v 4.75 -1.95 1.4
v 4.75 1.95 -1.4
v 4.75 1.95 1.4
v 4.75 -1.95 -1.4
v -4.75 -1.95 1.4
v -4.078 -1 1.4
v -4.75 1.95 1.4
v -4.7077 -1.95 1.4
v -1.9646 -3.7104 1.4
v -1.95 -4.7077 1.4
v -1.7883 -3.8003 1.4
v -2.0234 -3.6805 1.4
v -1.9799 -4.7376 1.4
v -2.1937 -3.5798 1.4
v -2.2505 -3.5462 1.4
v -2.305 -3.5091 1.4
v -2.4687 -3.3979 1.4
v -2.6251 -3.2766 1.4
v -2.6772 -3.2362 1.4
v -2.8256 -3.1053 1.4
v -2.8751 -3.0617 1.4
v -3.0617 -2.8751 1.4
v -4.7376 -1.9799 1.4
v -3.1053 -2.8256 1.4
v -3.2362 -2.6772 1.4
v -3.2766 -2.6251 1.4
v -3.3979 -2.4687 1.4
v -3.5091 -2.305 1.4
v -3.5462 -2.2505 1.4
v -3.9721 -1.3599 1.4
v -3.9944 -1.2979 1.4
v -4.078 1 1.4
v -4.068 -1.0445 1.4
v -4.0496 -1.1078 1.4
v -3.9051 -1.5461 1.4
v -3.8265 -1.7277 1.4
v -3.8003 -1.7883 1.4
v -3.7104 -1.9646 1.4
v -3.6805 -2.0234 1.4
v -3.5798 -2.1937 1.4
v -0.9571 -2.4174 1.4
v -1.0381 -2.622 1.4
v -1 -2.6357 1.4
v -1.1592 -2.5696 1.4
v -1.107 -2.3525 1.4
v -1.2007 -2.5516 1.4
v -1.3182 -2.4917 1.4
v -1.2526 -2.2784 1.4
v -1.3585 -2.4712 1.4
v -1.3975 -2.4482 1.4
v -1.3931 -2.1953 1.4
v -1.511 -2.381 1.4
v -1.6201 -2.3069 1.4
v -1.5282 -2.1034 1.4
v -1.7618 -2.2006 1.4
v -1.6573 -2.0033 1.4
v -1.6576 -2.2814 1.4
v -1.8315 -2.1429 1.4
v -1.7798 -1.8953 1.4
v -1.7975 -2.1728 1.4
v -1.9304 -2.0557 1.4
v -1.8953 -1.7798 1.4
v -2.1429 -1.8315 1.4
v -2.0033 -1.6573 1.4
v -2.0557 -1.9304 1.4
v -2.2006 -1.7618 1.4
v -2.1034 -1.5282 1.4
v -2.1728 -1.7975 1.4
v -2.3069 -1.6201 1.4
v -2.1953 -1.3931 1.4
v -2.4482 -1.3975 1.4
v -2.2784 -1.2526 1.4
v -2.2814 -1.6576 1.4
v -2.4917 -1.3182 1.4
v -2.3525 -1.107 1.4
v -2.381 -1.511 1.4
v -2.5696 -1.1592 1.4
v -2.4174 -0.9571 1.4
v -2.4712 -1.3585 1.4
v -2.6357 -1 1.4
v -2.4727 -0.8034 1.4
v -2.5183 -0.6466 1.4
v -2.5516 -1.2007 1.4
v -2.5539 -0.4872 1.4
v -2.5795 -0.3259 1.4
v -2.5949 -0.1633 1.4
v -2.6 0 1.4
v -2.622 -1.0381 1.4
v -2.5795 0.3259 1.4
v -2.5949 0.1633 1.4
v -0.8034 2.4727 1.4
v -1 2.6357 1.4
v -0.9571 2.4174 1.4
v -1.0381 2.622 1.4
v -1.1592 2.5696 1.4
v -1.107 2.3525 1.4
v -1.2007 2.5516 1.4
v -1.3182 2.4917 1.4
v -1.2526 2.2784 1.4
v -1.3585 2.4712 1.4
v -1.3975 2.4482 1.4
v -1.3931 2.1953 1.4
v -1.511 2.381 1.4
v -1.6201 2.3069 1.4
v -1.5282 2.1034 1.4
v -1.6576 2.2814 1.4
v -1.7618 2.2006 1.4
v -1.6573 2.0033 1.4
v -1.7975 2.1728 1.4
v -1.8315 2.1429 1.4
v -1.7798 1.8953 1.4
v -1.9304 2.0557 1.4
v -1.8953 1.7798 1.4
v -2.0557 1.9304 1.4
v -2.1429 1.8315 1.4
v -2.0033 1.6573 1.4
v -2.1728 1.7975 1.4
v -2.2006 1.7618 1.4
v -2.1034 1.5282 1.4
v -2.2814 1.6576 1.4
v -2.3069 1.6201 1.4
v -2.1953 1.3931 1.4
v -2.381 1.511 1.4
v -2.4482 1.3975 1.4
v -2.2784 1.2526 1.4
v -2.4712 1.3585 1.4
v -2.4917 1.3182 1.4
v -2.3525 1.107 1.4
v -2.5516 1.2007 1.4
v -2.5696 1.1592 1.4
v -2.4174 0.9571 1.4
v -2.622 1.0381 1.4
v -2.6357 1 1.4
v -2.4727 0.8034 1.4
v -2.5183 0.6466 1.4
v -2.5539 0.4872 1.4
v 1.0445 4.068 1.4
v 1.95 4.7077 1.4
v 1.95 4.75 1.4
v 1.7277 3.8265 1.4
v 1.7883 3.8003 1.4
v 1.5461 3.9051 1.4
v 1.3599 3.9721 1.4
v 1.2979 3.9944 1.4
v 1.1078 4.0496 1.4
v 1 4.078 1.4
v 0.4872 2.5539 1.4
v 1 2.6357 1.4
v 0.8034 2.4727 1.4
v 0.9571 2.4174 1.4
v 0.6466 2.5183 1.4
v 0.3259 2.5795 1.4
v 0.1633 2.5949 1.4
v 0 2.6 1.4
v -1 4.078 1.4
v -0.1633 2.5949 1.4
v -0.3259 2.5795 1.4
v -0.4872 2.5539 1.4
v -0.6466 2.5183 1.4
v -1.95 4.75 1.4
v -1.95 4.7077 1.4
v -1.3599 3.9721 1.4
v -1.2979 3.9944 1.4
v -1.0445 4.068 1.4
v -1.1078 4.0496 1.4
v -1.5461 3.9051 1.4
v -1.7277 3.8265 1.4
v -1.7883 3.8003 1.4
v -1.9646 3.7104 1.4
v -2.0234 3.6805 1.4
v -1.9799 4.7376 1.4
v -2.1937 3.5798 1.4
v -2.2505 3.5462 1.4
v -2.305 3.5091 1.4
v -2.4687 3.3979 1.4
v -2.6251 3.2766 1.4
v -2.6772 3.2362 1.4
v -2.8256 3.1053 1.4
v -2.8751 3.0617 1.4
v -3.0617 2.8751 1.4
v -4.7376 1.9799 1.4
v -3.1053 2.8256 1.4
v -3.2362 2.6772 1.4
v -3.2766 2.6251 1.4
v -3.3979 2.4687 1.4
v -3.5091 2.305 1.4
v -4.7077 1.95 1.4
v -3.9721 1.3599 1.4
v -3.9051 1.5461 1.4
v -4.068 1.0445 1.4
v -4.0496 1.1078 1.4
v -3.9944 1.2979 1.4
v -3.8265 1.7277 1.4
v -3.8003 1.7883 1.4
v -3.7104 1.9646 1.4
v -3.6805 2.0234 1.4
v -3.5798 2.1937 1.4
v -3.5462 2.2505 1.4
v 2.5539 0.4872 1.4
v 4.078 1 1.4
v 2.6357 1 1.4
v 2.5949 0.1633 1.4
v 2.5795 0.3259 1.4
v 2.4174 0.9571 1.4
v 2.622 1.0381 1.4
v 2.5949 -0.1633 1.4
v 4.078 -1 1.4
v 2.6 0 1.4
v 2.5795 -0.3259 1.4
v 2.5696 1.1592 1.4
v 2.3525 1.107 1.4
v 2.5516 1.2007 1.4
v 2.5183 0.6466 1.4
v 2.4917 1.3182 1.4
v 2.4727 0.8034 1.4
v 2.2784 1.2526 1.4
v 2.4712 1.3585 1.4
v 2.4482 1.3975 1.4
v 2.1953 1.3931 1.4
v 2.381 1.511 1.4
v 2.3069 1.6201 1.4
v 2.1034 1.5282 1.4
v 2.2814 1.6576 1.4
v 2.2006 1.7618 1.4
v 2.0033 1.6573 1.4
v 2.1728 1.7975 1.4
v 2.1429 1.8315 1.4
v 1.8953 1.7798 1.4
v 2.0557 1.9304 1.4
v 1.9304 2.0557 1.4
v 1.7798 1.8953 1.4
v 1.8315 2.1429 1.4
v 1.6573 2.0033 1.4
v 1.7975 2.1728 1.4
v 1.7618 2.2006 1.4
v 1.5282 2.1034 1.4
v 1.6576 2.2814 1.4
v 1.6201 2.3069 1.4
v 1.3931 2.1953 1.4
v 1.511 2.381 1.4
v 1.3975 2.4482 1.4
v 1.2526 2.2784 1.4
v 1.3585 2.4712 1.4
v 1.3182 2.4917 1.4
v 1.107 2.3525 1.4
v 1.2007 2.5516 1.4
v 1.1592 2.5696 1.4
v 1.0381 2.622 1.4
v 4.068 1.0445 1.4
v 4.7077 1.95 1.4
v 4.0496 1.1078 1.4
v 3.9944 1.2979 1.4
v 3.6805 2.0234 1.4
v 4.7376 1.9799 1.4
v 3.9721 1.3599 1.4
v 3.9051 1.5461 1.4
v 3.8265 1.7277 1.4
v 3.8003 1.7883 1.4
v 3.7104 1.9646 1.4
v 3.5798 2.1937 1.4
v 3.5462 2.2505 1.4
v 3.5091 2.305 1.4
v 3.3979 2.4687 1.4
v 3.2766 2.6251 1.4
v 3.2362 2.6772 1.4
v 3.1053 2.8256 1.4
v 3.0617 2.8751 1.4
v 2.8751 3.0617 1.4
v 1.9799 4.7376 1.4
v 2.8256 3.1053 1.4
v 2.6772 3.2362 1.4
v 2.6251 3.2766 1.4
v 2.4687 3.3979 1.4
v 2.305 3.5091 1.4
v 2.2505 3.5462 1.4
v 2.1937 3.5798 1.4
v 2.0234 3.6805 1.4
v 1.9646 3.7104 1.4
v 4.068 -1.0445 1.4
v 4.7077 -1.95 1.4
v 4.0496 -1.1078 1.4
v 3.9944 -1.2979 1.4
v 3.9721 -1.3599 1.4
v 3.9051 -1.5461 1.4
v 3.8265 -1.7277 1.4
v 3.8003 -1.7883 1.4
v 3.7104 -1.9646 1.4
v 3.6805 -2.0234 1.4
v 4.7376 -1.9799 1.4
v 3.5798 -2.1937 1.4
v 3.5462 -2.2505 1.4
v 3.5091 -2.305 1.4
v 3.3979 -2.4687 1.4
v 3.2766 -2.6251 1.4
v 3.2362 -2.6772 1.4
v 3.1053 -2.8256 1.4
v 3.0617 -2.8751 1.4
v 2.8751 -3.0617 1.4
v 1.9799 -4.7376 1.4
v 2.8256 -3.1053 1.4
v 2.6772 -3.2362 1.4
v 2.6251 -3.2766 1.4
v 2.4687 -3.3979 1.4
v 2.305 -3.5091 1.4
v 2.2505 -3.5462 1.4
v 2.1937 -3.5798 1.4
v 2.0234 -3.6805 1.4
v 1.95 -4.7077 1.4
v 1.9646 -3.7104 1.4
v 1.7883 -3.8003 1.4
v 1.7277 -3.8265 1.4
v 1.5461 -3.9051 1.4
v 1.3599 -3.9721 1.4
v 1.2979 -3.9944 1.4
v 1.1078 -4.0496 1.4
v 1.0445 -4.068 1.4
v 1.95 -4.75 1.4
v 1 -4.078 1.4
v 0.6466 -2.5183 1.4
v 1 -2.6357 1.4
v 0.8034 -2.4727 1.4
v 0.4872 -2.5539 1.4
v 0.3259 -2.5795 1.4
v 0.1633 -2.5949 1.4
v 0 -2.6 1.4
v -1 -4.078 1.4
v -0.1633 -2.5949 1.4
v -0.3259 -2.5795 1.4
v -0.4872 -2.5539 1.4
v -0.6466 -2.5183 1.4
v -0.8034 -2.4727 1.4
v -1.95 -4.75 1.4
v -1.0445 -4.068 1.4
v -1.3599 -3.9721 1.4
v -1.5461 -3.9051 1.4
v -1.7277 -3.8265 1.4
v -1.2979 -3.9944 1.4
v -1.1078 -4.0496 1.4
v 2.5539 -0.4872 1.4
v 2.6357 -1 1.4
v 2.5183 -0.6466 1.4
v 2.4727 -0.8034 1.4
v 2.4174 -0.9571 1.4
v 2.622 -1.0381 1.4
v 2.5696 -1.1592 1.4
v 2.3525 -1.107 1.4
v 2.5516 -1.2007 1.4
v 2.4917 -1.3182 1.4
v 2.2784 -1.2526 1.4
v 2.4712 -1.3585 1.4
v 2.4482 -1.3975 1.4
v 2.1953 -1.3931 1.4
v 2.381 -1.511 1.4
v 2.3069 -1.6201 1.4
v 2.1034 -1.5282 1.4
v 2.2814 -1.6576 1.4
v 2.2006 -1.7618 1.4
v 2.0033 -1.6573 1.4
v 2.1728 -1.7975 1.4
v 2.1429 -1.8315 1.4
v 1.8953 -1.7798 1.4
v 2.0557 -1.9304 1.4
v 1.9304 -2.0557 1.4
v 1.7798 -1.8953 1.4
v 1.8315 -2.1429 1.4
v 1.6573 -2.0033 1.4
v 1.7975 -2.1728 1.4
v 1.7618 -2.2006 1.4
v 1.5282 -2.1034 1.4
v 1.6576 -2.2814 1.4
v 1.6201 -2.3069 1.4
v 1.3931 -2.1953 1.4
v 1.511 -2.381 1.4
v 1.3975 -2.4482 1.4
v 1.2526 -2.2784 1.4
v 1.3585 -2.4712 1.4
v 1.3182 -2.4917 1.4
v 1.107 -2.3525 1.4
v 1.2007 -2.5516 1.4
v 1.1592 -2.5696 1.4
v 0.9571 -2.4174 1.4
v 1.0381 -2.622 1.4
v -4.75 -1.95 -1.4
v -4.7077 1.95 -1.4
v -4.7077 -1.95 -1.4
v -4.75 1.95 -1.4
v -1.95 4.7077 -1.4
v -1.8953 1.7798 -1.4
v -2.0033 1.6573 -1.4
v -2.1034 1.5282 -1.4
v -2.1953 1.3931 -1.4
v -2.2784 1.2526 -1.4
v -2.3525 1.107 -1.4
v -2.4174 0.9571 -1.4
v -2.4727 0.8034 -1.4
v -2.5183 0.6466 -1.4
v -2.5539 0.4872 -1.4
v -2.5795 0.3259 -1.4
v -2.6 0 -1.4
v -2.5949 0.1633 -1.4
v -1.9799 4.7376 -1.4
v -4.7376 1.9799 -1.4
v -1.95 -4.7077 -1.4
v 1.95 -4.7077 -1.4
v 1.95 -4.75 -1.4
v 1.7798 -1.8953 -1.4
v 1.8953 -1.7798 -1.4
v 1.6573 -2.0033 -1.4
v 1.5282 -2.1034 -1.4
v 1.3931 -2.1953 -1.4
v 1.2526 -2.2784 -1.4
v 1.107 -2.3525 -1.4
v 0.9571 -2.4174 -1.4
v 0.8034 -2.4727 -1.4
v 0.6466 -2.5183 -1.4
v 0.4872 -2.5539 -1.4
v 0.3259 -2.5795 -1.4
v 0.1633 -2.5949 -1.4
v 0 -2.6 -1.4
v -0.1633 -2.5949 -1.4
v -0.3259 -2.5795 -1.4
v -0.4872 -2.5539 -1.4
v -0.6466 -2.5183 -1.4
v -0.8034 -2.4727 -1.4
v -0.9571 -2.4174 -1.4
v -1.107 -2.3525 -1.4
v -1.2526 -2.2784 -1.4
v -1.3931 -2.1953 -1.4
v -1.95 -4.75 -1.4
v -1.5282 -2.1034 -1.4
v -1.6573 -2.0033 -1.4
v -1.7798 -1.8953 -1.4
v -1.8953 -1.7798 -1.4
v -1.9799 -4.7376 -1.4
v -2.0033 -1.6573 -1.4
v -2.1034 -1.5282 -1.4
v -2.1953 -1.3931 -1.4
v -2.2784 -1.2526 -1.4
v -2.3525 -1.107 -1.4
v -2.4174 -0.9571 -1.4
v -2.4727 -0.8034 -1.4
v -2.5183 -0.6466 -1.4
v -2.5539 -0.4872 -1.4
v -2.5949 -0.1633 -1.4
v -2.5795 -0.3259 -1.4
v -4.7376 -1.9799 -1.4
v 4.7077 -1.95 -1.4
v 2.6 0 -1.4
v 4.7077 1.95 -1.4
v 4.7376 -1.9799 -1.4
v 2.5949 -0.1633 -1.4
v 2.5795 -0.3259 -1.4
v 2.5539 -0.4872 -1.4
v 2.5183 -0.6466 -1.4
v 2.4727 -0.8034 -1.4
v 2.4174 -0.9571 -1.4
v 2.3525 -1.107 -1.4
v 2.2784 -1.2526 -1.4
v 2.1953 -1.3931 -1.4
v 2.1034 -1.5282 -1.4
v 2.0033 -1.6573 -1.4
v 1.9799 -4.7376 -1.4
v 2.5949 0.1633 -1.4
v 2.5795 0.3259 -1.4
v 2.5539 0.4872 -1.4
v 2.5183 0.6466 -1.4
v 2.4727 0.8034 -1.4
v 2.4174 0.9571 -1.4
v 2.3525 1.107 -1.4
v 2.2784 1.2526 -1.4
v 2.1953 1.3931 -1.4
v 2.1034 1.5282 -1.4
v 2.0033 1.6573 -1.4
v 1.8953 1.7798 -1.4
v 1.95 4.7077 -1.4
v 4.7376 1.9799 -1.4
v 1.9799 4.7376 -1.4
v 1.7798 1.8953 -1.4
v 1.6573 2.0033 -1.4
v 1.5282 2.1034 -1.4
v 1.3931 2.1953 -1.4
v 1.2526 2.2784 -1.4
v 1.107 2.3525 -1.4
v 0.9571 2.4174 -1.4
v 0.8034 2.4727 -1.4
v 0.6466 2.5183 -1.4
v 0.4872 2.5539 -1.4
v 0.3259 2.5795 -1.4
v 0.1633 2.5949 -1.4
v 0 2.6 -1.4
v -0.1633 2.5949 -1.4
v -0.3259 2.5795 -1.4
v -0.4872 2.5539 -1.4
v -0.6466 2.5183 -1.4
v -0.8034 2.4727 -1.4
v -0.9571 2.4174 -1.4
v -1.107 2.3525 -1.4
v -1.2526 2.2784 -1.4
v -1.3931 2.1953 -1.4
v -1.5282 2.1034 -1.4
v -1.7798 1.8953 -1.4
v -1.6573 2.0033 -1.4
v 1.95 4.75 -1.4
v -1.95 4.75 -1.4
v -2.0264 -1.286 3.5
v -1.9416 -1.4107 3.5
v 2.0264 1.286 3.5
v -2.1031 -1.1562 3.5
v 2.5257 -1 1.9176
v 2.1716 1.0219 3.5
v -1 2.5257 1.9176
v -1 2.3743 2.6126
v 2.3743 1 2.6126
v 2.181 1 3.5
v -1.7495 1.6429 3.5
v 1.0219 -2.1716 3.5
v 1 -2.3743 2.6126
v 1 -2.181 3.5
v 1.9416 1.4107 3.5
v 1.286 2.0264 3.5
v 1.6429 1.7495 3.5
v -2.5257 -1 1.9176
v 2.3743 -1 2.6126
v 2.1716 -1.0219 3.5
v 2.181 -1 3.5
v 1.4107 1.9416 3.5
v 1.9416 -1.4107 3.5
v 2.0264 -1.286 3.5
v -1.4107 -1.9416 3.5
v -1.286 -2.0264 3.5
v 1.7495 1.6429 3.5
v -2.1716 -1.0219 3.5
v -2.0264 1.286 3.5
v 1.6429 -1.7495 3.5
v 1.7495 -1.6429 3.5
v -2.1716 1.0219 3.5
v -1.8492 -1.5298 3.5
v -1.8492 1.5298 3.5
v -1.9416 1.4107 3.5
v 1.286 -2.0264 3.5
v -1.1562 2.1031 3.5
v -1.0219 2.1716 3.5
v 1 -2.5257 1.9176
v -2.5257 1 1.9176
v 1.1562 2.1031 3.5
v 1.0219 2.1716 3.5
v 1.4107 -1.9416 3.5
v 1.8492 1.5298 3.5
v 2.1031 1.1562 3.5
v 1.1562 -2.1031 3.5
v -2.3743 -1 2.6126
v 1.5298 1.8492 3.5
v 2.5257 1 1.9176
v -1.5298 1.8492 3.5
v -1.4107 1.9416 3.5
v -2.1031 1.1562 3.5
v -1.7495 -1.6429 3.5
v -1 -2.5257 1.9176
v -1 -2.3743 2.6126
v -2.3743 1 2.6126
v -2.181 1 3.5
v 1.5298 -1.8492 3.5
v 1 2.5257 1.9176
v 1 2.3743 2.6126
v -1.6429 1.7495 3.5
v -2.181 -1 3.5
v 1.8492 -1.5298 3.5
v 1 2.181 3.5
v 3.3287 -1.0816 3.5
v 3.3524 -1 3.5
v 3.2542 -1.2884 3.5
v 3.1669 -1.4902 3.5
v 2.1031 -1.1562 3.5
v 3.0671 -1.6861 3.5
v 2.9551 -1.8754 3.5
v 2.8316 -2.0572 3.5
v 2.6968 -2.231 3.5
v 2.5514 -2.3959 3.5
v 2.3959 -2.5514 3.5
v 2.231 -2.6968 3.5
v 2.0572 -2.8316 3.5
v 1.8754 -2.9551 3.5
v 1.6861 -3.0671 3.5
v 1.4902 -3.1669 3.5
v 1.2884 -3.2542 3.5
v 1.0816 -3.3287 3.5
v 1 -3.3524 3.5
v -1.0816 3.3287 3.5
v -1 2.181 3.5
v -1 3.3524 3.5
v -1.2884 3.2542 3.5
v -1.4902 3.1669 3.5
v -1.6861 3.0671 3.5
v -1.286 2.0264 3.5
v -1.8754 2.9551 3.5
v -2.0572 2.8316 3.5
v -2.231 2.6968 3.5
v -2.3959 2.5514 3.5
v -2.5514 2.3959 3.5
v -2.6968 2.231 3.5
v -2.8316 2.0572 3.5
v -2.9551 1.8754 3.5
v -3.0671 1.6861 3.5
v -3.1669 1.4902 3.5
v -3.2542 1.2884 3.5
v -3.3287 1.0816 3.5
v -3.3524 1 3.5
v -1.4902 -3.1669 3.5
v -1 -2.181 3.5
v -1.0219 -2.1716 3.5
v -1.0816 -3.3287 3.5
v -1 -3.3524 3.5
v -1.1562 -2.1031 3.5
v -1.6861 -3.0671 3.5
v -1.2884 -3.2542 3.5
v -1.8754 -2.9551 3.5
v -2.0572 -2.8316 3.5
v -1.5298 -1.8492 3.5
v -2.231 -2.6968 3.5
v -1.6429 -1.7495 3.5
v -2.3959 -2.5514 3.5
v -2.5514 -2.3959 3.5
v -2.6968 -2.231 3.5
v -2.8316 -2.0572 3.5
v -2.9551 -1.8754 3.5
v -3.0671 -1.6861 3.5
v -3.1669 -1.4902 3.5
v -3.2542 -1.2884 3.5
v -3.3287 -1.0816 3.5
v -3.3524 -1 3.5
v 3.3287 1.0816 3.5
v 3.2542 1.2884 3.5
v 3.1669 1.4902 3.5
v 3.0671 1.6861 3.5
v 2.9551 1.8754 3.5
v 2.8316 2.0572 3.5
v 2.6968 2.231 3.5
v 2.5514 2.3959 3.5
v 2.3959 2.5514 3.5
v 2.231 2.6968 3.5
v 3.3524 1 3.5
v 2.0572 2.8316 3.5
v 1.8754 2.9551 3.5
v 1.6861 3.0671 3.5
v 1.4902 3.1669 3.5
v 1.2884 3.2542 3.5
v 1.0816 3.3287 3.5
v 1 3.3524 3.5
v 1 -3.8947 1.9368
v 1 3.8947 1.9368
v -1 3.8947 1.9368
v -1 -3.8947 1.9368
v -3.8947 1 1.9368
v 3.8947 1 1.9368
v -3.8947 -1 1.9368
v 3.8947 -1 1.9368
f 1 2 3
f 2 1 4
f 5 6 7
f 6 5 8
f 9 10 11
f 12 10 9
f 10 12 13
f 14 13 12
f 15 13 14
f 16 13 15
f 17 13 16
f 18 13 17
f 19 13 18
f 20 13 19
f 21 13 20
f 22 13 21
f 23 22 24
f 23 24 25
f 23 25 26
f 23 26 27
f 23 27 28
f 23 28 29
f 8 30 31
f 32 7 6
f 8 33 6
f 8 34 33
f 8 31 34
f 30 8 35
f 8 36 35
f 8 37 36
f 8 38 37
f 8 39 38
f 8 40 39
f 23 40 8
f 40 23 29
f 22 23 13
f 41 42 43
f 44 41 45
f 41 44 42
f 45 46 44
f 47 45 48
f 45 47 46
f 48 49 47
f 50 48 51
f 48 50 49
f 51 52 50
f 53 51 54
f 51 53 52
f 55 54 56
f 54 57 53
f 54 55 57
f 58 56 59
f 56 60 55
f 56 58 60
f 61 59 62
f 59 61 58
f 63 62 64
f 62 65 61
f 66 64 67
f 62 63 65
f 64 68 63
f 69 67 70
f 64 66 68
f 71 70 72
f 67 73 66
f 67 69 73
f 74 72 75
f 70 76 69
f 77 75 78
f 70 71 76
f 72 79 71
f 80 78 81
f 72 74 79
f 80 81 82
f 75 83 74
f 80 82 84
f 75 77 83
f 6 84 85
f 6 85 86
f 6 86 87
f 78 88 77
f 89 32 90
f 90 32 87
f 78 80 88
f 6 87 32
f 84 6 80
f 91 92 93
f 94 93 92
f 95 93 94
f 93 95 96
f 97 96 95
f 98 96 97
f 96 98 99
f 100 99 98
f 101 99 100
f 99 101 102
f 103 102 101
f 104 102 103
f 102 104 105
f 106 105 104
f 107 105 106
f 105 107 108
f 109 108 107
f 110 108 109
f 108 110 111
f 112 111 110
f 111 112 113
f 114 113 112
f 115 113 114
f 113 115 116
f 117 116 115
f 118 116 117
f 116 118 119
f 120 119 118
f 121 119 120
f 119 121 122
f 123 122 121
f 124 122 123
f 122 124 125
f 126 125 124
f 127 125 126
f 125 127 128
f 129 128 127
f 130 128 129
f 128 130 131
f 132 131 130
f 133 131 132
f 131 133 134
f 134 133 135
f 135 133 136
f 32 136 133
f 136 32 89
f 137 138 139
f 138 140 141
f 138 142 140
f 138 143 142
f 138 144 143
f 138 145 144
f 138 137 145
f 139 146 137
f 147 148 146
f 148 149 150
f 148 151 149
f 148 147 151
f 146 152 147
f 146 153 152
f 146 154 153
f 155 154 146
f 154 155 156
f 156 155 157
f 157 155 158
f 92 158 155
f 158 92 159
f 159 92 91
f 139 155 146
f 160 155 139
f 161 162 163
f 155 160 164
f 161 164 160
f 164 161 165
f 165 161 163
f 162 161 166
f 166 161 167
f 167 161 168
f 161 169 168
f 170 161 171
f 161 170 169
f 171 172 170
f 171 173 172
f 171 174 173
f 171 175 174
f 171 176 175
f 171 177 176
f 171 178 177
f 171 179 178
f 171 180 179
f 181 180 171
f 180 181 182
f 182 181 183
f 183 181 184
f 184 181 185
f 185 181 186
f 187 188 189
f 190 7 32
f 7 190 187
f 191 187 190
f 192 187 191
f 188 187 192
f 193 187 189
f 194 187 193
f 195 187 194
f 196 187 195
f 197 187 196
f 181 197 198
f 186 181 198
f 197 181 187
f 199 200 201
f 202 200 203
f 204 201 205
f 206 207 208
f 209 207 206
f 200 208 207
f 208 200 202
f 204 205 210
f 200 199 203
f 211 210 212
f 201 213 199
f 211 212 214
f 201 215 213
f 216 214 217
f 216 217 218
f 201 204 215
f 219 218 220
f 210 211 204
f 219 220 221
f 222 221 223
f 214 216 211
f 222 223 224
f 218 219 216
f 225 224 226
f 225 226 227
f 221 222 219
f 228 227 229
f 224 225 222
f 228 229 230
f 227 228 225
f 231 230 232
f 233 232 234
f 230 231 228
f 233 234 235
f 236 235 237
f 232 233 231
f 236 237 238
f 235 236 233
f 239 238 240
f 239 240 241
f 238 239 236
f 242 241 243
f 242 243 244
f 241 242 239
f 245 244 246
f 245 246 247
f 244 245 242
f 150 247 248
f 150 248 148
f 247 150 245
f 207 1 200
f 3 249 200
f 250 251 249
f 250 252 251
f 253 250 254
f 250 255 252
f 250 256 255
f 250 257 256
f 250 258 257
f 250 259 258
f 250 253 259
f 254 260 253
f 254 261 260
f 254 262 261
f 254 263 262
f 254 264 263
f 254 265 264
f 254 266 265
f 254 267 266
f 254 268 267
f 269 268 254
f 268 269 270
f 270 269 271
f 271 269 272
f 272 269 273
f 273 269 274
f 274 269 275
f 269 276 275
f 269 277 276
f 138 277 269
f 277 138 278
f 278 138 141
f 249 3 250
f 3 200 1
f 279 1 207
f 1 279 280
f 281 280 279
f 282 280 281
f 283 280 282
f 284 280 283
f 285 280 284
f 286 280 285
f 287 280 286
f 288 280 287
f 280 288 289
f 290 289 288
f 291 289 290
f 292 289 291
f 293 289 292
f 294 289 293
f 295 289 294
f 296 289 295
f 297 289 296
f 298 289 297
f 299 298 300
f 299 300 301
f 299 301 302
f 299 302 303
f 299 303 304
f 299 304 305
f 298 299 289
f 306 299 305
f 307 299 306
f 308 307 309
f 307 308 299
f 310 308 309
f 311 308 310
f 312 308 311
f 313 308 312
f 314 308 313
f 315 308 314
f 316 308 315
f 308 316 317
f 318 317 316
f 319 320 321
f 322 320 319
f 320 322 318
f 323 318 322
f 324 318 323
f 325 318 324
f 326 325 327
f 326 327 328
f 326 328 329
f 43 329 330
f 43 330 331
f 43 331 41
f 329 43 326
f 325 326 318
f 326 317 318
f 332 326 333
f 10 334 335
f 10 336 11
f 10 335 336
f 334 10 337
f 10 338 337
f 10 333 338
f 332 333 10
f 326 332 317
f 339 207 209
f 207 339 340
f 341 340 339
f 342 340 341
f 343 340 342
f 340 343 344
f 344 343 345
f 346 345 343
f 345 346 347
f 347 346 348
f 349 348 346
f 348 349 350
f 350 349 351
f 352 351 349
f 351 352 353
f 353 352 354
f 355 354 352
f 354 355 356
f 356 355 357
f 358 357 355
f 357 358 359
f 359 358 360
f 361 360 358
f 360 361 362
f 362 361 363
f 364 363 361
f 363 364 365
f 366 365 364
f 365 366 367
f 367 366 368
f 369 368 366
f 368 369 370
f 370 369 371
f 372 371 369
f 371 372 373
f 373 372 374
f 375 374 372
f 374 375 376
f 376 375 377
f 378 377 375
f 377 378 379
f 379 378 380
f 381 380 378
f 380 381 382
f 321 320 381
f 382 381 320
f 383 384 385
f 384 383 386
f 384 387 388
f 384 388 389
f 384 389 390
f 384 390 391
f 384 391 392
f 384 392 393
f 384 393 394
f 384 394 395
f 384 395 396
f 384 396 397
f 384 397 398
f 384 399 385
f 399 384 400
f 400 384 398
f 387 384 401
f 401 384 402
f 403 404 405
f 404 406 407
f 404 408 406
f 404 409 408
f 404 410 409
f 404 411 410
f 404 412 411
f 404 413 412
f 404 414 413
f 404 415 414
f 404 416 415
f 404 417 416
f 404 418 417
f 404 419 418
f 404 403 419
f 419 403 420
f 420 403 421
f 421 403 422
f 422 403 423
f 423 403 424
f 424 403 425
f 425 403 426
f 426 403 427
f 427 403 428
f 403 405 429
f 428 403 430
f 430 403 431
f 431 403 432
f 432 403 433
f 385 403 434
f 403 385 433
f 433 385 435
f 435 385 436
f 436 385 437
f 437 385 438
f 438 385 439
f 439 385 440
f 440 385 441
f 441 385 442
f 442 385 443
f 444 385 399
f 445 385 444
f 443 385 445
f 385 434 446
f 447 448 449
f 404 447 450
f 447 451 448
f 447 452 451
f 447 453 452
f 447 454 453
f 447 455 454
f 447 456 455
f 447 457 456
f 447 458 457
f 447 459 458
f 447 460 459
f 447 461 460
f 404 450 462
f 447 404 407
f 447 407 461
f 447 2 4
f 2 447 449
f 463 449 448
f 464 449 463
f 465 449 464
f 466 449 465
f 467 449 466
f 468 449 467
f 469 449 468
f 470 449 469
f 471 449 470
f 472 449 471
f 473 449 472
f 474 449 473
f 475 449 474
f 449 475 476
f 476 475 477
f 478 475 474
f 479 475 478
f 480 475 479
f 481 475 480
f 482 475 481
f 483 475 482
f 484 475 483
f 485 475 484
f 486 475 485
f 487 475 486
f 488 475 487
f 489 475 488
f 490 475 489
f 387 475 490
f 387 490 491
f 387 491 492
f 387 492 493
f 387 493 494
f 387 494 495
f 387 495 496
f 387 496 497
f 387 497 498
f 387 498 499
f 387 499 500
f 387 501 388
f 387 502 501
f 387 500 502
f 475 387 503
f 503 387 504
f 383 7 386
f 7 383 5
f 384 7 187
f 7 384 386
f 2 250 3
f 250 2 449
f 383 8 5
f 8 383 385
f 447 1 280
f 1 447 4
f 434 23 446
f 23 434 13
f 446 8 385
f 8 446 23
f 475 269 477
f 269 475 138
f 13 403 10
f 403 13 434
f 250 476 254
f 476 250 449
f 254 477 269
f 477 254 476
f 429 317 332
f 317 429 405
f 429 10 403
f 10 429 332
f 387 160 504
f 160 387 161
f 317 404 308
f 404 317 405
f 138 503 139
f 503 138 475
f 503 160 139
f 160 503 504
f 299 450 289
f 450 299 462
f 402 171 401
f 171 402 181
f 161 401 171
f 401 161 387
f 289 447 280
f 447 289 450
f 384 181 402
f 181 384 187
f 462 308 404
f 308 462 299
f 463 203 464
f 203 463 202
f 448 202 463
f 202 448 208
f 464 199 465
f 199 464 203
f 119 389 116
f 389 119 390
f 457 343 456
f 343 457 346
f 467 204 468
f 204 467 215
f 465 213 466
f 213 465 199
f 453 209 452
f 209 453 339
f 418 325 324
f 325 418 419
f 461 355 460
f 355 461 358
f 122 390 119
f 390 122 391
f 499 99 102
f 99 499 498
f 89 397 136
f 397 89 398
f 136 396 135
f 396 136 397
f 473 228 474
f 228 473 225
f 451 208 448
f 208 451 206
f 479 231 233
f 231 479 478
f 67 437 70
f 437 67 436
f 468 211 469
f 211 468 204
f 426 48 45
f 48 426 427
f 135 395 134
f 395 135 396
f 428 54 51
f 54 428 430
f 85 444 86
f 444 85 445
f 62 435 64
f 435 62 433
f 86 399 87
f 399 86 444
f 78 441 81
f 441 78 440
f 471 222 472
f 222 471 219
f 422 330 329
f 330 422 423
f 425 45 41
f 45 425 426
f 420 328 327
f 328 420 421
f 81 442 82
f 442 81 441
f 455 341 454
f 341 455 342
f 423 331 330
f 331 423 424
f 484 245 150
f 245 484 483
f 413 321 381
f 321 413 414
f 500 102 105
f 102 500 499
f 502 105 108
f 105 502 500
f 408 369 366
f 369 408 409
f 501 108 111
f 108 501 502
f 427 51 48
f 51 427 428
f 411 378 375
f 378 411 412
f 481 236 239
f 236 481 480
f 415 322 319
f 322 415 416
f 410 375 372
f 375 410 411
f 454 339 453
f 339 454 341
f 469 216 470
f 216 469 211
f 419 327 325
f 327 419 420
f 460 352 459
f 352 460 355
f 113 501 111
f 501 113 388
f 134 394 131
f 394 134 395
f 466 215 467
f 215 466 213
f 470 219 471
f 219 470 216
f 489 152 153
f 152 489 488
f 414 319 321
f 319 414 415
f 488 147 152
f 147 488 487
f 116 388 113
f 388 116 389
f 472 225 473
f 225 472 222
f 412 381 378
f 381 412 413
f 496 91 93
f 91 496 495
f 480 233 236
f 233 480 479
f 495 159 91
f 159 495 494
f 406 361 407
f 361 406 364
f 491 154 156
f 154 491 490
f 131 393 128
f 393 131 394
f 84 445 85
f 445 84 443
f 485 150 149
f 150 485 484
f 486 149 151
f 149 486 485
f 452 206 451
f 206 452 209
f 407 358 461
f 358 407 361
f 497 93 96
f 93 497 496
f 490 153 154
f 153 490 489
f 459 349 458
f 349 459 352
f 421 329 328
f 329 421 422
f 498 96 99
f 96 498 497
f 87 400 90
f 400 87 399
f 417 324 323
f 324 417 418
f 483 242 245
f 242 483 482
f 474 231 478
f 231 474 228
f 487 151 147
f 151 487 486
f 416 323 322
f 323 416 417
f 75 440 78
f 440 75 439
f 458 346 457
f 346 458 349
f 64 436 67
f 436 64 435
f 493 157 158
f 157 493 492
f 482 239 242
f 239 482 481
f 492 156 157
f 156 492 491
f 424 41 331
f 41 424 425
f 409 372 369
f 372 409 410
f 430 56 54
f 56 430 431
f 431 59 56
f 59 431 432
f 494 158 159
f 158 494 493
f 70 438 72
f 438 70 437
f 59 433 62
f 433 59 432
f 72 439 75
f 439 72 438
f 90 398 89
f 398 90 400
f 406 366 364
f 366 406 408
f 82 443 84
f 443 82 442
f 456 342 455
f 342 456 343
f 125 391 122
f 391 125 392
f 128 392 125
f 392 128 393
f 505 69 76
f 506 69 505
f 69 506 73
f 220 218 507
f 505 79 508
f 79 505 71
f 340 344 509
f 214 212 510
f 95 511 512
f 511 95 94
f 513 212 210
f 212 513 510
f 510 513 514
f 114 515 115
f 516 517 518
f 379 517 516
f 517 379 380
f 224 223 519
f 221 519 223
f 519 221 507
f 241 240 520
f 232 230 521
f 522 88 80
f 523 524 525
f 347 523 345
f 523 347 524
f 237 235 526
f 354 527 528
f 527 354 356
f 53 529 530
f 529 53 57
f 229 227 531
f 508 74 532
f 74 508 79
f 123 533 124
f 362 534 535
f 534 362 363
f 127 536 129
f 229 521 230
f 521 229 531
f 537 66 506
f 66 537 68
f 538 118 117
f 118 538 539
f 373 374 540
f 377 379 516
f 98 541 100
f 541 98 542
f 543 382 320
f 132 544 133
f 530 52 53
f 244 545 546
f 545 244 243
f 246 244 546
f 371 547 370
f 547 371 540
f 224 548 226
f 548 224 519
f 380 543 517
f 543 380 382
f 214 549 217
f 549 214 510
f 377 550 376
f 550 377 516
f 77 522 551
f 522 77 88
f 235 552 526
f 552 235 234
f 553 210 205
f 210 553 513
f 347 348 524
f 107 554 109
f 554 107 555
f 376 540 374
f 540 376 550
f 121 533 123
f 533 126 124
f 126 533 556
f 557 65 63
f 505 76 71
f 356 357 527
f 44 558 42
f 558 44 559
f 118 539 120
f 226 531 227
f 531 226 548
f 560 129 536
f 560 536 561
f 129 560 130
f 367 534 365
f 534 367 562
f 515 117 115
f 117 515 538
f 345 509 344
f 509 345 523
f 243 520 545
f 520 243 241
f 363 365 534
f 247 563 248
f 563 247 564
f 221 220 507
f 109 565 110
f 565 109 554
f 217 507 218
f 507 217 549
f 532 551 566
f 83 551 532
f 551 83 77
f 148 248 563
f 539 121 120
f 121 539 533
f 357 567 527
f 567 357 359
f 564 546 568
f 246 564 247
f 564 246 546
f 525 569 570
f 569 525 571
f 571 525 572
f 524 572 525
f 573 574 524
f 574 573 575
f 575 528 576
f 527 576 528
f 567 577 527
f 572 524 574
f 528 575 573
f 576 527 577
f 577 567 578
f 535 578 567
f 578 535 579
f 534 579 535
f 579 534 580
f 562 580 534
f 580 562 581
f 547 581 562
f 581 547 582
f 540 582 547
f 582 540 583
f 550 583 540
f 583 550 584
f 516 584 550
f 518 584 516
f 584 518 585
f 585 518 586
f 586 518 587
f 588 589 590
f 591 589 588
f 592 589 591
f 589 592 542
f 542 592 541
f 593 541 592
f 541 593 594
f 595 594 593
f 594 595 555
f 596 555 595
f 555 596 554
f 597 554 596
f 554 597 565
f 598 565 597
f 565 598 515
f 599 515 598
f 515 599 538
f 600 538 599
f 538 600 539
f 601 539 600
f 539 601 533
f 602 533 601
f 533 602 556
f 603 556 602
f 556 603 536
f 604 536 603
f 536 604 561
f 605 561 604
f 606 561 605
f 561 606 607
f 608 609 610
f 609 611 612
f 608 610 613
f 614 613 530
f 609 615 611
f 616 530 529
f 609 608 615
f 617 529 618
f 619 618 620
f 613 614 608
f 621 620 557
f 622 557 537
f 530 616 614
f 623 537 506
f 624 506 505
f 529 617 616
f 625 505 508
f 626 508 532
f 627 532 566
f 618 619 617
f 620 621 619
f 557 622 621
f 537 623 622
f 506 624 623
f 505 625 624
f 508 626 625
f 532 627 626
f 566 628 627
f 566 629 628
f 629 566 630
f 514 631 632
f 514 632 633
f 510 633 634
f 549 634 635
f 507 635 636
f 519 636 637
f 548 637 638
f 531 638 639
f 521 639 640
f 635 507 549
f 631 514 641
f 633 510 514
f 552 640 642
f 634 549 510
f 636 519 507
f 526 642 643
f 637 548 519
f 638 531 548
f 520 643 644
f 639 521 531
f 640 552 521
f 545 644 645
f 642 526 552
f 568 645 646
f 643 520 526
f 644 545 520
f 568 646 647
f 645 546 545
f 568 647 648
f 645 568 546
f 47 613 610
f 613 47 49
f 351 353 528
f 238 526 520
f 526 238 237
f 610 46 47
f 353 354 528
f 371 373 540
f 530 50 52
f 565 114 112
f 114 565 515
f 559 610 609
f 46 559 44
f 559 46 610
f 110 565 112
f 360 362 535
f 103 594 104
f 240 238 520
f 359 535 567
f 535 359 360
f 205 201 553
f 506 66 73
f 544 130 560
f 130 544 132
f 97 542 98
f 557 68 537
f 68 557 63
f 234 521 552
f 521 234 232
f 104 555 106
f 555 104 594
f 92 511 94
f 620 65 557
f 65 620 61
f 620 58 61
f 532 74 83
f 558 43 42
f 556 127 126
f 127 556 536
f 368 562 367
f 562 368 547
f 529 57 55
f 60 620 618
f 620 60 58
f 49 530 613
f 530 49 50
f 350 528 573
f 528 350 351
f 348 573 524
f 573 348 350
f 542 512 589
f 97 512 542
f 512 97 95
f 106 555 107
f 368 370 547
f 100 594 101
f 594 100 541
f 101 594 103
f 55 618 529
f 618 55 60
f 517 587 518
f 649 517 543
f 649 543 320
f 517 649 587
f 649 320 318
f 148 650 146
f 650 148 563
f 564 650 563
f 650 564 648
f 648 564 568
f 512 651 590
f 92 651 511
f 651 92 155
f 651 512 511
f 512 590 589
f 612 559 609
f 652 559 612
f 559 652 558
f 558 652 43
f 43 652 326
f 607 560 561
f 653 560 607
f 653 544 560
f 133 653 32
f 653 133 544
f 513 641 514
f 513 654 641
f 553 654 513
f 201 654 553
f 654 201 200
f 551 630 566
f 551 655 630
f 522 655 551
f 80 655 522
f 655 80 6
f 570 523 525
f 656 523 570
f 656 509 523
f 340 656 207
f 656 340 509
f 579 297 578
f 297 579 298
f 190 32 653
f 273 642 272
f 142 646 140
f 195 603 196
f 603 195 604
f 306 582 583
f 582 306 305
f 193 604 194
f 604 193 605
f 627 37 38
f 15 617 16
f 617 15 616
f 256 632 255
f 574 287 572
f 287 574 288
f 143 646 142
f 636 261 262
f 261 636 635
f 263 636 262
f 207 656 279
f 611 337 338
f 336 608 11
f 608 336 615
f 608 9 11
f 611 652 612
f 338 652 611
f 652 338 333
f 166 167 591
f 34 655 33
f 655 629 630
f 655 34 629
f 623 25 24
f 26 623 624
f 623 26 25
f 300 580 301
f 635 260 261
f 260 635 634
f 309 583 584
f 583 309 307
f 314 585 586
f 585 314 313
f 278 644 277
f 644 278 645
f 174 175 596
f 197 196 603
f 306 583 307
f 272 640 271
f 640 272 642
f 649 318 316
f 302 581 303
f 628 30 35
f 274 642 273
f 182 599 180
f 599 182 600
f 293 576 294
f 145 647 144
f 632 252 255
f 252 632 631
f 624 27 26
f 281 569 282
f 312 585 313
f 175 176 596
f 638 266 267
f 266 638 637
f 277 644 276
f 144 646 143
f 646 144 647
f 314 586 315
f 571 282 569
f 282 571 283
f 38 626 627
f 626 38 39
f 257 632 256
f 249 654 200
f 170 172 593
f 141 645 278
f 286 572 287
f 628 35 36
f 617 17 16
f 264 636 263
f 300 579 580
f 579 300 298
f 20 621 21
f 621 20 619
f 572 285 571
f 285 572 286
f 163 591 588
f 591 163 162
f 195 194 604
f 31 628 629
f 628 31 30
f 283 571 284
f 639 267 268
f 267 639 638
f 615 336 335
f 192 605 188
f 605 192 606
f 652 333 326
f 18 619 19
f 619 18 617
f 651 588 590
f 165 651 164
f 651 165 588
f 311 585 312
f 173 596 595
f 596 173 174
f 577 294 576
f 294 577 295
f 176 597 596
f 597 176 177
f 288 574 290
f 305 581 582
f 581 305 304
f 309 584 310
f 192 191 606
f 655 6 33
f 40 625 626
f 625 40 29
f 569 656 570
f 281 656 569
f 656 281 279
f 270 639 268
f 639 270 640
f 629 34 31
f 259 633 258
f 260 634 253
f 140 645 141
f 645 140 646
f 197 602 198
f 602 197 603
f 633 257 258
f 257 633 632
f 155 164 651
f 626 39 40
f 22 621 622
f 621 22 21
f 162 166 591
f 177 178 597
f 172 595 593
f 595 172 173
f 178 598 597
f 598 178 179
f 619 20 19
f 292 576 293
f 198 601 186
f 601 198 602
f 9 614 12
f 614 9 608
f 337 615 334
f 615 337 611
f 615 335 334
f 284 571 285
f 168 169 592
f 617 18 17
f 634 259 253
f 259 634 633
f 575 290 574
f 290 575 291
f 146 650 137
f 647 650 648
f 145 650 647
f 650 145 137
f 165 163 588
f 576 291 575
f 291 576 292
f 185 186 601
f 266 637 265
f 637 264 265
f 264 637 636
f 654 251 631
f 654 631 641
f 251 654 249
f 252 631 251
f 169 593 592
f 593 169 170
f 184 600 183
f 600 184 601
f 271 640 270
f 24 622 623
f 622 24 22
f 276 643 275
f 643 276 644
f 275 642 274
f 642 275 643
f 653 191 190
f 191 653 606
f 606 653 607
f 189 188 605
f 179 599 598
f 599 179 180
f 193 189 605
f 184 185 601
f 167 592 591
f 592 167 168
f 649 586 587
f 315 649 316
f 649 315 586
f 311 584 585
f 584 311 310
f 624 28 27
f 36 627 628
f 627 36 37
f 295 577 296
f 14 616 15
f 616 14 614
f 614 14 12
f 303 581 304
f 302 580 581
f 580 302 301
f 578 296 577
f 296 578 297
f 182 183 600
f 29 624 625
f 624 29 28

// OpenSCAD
$fn=100;

difference() {
    union() {
        cube([9.5,3.9,2.8], center=true);
        rotate([0,0,45]) cube([9.5,3.9,2.8], center=true);
        rotate([0,0,90]) cube([9.5,3.9,2.8], center=true);
        rotate([0,0,-45]) cube([9.5,3.9,2.8], center=true);
    }
    cylinder(d=5.2,h=10,center=true);  
}

translate([0,0,2]) difference() {
    cylinder(d1=9,d2=7,h=3, center=true);
    union(){
        cylinder(d1=6,d2=4.8,h=3, center=true);  
        cube([2,10,10], center=true);
        cube([10,2,10], center=true);
    }
}
